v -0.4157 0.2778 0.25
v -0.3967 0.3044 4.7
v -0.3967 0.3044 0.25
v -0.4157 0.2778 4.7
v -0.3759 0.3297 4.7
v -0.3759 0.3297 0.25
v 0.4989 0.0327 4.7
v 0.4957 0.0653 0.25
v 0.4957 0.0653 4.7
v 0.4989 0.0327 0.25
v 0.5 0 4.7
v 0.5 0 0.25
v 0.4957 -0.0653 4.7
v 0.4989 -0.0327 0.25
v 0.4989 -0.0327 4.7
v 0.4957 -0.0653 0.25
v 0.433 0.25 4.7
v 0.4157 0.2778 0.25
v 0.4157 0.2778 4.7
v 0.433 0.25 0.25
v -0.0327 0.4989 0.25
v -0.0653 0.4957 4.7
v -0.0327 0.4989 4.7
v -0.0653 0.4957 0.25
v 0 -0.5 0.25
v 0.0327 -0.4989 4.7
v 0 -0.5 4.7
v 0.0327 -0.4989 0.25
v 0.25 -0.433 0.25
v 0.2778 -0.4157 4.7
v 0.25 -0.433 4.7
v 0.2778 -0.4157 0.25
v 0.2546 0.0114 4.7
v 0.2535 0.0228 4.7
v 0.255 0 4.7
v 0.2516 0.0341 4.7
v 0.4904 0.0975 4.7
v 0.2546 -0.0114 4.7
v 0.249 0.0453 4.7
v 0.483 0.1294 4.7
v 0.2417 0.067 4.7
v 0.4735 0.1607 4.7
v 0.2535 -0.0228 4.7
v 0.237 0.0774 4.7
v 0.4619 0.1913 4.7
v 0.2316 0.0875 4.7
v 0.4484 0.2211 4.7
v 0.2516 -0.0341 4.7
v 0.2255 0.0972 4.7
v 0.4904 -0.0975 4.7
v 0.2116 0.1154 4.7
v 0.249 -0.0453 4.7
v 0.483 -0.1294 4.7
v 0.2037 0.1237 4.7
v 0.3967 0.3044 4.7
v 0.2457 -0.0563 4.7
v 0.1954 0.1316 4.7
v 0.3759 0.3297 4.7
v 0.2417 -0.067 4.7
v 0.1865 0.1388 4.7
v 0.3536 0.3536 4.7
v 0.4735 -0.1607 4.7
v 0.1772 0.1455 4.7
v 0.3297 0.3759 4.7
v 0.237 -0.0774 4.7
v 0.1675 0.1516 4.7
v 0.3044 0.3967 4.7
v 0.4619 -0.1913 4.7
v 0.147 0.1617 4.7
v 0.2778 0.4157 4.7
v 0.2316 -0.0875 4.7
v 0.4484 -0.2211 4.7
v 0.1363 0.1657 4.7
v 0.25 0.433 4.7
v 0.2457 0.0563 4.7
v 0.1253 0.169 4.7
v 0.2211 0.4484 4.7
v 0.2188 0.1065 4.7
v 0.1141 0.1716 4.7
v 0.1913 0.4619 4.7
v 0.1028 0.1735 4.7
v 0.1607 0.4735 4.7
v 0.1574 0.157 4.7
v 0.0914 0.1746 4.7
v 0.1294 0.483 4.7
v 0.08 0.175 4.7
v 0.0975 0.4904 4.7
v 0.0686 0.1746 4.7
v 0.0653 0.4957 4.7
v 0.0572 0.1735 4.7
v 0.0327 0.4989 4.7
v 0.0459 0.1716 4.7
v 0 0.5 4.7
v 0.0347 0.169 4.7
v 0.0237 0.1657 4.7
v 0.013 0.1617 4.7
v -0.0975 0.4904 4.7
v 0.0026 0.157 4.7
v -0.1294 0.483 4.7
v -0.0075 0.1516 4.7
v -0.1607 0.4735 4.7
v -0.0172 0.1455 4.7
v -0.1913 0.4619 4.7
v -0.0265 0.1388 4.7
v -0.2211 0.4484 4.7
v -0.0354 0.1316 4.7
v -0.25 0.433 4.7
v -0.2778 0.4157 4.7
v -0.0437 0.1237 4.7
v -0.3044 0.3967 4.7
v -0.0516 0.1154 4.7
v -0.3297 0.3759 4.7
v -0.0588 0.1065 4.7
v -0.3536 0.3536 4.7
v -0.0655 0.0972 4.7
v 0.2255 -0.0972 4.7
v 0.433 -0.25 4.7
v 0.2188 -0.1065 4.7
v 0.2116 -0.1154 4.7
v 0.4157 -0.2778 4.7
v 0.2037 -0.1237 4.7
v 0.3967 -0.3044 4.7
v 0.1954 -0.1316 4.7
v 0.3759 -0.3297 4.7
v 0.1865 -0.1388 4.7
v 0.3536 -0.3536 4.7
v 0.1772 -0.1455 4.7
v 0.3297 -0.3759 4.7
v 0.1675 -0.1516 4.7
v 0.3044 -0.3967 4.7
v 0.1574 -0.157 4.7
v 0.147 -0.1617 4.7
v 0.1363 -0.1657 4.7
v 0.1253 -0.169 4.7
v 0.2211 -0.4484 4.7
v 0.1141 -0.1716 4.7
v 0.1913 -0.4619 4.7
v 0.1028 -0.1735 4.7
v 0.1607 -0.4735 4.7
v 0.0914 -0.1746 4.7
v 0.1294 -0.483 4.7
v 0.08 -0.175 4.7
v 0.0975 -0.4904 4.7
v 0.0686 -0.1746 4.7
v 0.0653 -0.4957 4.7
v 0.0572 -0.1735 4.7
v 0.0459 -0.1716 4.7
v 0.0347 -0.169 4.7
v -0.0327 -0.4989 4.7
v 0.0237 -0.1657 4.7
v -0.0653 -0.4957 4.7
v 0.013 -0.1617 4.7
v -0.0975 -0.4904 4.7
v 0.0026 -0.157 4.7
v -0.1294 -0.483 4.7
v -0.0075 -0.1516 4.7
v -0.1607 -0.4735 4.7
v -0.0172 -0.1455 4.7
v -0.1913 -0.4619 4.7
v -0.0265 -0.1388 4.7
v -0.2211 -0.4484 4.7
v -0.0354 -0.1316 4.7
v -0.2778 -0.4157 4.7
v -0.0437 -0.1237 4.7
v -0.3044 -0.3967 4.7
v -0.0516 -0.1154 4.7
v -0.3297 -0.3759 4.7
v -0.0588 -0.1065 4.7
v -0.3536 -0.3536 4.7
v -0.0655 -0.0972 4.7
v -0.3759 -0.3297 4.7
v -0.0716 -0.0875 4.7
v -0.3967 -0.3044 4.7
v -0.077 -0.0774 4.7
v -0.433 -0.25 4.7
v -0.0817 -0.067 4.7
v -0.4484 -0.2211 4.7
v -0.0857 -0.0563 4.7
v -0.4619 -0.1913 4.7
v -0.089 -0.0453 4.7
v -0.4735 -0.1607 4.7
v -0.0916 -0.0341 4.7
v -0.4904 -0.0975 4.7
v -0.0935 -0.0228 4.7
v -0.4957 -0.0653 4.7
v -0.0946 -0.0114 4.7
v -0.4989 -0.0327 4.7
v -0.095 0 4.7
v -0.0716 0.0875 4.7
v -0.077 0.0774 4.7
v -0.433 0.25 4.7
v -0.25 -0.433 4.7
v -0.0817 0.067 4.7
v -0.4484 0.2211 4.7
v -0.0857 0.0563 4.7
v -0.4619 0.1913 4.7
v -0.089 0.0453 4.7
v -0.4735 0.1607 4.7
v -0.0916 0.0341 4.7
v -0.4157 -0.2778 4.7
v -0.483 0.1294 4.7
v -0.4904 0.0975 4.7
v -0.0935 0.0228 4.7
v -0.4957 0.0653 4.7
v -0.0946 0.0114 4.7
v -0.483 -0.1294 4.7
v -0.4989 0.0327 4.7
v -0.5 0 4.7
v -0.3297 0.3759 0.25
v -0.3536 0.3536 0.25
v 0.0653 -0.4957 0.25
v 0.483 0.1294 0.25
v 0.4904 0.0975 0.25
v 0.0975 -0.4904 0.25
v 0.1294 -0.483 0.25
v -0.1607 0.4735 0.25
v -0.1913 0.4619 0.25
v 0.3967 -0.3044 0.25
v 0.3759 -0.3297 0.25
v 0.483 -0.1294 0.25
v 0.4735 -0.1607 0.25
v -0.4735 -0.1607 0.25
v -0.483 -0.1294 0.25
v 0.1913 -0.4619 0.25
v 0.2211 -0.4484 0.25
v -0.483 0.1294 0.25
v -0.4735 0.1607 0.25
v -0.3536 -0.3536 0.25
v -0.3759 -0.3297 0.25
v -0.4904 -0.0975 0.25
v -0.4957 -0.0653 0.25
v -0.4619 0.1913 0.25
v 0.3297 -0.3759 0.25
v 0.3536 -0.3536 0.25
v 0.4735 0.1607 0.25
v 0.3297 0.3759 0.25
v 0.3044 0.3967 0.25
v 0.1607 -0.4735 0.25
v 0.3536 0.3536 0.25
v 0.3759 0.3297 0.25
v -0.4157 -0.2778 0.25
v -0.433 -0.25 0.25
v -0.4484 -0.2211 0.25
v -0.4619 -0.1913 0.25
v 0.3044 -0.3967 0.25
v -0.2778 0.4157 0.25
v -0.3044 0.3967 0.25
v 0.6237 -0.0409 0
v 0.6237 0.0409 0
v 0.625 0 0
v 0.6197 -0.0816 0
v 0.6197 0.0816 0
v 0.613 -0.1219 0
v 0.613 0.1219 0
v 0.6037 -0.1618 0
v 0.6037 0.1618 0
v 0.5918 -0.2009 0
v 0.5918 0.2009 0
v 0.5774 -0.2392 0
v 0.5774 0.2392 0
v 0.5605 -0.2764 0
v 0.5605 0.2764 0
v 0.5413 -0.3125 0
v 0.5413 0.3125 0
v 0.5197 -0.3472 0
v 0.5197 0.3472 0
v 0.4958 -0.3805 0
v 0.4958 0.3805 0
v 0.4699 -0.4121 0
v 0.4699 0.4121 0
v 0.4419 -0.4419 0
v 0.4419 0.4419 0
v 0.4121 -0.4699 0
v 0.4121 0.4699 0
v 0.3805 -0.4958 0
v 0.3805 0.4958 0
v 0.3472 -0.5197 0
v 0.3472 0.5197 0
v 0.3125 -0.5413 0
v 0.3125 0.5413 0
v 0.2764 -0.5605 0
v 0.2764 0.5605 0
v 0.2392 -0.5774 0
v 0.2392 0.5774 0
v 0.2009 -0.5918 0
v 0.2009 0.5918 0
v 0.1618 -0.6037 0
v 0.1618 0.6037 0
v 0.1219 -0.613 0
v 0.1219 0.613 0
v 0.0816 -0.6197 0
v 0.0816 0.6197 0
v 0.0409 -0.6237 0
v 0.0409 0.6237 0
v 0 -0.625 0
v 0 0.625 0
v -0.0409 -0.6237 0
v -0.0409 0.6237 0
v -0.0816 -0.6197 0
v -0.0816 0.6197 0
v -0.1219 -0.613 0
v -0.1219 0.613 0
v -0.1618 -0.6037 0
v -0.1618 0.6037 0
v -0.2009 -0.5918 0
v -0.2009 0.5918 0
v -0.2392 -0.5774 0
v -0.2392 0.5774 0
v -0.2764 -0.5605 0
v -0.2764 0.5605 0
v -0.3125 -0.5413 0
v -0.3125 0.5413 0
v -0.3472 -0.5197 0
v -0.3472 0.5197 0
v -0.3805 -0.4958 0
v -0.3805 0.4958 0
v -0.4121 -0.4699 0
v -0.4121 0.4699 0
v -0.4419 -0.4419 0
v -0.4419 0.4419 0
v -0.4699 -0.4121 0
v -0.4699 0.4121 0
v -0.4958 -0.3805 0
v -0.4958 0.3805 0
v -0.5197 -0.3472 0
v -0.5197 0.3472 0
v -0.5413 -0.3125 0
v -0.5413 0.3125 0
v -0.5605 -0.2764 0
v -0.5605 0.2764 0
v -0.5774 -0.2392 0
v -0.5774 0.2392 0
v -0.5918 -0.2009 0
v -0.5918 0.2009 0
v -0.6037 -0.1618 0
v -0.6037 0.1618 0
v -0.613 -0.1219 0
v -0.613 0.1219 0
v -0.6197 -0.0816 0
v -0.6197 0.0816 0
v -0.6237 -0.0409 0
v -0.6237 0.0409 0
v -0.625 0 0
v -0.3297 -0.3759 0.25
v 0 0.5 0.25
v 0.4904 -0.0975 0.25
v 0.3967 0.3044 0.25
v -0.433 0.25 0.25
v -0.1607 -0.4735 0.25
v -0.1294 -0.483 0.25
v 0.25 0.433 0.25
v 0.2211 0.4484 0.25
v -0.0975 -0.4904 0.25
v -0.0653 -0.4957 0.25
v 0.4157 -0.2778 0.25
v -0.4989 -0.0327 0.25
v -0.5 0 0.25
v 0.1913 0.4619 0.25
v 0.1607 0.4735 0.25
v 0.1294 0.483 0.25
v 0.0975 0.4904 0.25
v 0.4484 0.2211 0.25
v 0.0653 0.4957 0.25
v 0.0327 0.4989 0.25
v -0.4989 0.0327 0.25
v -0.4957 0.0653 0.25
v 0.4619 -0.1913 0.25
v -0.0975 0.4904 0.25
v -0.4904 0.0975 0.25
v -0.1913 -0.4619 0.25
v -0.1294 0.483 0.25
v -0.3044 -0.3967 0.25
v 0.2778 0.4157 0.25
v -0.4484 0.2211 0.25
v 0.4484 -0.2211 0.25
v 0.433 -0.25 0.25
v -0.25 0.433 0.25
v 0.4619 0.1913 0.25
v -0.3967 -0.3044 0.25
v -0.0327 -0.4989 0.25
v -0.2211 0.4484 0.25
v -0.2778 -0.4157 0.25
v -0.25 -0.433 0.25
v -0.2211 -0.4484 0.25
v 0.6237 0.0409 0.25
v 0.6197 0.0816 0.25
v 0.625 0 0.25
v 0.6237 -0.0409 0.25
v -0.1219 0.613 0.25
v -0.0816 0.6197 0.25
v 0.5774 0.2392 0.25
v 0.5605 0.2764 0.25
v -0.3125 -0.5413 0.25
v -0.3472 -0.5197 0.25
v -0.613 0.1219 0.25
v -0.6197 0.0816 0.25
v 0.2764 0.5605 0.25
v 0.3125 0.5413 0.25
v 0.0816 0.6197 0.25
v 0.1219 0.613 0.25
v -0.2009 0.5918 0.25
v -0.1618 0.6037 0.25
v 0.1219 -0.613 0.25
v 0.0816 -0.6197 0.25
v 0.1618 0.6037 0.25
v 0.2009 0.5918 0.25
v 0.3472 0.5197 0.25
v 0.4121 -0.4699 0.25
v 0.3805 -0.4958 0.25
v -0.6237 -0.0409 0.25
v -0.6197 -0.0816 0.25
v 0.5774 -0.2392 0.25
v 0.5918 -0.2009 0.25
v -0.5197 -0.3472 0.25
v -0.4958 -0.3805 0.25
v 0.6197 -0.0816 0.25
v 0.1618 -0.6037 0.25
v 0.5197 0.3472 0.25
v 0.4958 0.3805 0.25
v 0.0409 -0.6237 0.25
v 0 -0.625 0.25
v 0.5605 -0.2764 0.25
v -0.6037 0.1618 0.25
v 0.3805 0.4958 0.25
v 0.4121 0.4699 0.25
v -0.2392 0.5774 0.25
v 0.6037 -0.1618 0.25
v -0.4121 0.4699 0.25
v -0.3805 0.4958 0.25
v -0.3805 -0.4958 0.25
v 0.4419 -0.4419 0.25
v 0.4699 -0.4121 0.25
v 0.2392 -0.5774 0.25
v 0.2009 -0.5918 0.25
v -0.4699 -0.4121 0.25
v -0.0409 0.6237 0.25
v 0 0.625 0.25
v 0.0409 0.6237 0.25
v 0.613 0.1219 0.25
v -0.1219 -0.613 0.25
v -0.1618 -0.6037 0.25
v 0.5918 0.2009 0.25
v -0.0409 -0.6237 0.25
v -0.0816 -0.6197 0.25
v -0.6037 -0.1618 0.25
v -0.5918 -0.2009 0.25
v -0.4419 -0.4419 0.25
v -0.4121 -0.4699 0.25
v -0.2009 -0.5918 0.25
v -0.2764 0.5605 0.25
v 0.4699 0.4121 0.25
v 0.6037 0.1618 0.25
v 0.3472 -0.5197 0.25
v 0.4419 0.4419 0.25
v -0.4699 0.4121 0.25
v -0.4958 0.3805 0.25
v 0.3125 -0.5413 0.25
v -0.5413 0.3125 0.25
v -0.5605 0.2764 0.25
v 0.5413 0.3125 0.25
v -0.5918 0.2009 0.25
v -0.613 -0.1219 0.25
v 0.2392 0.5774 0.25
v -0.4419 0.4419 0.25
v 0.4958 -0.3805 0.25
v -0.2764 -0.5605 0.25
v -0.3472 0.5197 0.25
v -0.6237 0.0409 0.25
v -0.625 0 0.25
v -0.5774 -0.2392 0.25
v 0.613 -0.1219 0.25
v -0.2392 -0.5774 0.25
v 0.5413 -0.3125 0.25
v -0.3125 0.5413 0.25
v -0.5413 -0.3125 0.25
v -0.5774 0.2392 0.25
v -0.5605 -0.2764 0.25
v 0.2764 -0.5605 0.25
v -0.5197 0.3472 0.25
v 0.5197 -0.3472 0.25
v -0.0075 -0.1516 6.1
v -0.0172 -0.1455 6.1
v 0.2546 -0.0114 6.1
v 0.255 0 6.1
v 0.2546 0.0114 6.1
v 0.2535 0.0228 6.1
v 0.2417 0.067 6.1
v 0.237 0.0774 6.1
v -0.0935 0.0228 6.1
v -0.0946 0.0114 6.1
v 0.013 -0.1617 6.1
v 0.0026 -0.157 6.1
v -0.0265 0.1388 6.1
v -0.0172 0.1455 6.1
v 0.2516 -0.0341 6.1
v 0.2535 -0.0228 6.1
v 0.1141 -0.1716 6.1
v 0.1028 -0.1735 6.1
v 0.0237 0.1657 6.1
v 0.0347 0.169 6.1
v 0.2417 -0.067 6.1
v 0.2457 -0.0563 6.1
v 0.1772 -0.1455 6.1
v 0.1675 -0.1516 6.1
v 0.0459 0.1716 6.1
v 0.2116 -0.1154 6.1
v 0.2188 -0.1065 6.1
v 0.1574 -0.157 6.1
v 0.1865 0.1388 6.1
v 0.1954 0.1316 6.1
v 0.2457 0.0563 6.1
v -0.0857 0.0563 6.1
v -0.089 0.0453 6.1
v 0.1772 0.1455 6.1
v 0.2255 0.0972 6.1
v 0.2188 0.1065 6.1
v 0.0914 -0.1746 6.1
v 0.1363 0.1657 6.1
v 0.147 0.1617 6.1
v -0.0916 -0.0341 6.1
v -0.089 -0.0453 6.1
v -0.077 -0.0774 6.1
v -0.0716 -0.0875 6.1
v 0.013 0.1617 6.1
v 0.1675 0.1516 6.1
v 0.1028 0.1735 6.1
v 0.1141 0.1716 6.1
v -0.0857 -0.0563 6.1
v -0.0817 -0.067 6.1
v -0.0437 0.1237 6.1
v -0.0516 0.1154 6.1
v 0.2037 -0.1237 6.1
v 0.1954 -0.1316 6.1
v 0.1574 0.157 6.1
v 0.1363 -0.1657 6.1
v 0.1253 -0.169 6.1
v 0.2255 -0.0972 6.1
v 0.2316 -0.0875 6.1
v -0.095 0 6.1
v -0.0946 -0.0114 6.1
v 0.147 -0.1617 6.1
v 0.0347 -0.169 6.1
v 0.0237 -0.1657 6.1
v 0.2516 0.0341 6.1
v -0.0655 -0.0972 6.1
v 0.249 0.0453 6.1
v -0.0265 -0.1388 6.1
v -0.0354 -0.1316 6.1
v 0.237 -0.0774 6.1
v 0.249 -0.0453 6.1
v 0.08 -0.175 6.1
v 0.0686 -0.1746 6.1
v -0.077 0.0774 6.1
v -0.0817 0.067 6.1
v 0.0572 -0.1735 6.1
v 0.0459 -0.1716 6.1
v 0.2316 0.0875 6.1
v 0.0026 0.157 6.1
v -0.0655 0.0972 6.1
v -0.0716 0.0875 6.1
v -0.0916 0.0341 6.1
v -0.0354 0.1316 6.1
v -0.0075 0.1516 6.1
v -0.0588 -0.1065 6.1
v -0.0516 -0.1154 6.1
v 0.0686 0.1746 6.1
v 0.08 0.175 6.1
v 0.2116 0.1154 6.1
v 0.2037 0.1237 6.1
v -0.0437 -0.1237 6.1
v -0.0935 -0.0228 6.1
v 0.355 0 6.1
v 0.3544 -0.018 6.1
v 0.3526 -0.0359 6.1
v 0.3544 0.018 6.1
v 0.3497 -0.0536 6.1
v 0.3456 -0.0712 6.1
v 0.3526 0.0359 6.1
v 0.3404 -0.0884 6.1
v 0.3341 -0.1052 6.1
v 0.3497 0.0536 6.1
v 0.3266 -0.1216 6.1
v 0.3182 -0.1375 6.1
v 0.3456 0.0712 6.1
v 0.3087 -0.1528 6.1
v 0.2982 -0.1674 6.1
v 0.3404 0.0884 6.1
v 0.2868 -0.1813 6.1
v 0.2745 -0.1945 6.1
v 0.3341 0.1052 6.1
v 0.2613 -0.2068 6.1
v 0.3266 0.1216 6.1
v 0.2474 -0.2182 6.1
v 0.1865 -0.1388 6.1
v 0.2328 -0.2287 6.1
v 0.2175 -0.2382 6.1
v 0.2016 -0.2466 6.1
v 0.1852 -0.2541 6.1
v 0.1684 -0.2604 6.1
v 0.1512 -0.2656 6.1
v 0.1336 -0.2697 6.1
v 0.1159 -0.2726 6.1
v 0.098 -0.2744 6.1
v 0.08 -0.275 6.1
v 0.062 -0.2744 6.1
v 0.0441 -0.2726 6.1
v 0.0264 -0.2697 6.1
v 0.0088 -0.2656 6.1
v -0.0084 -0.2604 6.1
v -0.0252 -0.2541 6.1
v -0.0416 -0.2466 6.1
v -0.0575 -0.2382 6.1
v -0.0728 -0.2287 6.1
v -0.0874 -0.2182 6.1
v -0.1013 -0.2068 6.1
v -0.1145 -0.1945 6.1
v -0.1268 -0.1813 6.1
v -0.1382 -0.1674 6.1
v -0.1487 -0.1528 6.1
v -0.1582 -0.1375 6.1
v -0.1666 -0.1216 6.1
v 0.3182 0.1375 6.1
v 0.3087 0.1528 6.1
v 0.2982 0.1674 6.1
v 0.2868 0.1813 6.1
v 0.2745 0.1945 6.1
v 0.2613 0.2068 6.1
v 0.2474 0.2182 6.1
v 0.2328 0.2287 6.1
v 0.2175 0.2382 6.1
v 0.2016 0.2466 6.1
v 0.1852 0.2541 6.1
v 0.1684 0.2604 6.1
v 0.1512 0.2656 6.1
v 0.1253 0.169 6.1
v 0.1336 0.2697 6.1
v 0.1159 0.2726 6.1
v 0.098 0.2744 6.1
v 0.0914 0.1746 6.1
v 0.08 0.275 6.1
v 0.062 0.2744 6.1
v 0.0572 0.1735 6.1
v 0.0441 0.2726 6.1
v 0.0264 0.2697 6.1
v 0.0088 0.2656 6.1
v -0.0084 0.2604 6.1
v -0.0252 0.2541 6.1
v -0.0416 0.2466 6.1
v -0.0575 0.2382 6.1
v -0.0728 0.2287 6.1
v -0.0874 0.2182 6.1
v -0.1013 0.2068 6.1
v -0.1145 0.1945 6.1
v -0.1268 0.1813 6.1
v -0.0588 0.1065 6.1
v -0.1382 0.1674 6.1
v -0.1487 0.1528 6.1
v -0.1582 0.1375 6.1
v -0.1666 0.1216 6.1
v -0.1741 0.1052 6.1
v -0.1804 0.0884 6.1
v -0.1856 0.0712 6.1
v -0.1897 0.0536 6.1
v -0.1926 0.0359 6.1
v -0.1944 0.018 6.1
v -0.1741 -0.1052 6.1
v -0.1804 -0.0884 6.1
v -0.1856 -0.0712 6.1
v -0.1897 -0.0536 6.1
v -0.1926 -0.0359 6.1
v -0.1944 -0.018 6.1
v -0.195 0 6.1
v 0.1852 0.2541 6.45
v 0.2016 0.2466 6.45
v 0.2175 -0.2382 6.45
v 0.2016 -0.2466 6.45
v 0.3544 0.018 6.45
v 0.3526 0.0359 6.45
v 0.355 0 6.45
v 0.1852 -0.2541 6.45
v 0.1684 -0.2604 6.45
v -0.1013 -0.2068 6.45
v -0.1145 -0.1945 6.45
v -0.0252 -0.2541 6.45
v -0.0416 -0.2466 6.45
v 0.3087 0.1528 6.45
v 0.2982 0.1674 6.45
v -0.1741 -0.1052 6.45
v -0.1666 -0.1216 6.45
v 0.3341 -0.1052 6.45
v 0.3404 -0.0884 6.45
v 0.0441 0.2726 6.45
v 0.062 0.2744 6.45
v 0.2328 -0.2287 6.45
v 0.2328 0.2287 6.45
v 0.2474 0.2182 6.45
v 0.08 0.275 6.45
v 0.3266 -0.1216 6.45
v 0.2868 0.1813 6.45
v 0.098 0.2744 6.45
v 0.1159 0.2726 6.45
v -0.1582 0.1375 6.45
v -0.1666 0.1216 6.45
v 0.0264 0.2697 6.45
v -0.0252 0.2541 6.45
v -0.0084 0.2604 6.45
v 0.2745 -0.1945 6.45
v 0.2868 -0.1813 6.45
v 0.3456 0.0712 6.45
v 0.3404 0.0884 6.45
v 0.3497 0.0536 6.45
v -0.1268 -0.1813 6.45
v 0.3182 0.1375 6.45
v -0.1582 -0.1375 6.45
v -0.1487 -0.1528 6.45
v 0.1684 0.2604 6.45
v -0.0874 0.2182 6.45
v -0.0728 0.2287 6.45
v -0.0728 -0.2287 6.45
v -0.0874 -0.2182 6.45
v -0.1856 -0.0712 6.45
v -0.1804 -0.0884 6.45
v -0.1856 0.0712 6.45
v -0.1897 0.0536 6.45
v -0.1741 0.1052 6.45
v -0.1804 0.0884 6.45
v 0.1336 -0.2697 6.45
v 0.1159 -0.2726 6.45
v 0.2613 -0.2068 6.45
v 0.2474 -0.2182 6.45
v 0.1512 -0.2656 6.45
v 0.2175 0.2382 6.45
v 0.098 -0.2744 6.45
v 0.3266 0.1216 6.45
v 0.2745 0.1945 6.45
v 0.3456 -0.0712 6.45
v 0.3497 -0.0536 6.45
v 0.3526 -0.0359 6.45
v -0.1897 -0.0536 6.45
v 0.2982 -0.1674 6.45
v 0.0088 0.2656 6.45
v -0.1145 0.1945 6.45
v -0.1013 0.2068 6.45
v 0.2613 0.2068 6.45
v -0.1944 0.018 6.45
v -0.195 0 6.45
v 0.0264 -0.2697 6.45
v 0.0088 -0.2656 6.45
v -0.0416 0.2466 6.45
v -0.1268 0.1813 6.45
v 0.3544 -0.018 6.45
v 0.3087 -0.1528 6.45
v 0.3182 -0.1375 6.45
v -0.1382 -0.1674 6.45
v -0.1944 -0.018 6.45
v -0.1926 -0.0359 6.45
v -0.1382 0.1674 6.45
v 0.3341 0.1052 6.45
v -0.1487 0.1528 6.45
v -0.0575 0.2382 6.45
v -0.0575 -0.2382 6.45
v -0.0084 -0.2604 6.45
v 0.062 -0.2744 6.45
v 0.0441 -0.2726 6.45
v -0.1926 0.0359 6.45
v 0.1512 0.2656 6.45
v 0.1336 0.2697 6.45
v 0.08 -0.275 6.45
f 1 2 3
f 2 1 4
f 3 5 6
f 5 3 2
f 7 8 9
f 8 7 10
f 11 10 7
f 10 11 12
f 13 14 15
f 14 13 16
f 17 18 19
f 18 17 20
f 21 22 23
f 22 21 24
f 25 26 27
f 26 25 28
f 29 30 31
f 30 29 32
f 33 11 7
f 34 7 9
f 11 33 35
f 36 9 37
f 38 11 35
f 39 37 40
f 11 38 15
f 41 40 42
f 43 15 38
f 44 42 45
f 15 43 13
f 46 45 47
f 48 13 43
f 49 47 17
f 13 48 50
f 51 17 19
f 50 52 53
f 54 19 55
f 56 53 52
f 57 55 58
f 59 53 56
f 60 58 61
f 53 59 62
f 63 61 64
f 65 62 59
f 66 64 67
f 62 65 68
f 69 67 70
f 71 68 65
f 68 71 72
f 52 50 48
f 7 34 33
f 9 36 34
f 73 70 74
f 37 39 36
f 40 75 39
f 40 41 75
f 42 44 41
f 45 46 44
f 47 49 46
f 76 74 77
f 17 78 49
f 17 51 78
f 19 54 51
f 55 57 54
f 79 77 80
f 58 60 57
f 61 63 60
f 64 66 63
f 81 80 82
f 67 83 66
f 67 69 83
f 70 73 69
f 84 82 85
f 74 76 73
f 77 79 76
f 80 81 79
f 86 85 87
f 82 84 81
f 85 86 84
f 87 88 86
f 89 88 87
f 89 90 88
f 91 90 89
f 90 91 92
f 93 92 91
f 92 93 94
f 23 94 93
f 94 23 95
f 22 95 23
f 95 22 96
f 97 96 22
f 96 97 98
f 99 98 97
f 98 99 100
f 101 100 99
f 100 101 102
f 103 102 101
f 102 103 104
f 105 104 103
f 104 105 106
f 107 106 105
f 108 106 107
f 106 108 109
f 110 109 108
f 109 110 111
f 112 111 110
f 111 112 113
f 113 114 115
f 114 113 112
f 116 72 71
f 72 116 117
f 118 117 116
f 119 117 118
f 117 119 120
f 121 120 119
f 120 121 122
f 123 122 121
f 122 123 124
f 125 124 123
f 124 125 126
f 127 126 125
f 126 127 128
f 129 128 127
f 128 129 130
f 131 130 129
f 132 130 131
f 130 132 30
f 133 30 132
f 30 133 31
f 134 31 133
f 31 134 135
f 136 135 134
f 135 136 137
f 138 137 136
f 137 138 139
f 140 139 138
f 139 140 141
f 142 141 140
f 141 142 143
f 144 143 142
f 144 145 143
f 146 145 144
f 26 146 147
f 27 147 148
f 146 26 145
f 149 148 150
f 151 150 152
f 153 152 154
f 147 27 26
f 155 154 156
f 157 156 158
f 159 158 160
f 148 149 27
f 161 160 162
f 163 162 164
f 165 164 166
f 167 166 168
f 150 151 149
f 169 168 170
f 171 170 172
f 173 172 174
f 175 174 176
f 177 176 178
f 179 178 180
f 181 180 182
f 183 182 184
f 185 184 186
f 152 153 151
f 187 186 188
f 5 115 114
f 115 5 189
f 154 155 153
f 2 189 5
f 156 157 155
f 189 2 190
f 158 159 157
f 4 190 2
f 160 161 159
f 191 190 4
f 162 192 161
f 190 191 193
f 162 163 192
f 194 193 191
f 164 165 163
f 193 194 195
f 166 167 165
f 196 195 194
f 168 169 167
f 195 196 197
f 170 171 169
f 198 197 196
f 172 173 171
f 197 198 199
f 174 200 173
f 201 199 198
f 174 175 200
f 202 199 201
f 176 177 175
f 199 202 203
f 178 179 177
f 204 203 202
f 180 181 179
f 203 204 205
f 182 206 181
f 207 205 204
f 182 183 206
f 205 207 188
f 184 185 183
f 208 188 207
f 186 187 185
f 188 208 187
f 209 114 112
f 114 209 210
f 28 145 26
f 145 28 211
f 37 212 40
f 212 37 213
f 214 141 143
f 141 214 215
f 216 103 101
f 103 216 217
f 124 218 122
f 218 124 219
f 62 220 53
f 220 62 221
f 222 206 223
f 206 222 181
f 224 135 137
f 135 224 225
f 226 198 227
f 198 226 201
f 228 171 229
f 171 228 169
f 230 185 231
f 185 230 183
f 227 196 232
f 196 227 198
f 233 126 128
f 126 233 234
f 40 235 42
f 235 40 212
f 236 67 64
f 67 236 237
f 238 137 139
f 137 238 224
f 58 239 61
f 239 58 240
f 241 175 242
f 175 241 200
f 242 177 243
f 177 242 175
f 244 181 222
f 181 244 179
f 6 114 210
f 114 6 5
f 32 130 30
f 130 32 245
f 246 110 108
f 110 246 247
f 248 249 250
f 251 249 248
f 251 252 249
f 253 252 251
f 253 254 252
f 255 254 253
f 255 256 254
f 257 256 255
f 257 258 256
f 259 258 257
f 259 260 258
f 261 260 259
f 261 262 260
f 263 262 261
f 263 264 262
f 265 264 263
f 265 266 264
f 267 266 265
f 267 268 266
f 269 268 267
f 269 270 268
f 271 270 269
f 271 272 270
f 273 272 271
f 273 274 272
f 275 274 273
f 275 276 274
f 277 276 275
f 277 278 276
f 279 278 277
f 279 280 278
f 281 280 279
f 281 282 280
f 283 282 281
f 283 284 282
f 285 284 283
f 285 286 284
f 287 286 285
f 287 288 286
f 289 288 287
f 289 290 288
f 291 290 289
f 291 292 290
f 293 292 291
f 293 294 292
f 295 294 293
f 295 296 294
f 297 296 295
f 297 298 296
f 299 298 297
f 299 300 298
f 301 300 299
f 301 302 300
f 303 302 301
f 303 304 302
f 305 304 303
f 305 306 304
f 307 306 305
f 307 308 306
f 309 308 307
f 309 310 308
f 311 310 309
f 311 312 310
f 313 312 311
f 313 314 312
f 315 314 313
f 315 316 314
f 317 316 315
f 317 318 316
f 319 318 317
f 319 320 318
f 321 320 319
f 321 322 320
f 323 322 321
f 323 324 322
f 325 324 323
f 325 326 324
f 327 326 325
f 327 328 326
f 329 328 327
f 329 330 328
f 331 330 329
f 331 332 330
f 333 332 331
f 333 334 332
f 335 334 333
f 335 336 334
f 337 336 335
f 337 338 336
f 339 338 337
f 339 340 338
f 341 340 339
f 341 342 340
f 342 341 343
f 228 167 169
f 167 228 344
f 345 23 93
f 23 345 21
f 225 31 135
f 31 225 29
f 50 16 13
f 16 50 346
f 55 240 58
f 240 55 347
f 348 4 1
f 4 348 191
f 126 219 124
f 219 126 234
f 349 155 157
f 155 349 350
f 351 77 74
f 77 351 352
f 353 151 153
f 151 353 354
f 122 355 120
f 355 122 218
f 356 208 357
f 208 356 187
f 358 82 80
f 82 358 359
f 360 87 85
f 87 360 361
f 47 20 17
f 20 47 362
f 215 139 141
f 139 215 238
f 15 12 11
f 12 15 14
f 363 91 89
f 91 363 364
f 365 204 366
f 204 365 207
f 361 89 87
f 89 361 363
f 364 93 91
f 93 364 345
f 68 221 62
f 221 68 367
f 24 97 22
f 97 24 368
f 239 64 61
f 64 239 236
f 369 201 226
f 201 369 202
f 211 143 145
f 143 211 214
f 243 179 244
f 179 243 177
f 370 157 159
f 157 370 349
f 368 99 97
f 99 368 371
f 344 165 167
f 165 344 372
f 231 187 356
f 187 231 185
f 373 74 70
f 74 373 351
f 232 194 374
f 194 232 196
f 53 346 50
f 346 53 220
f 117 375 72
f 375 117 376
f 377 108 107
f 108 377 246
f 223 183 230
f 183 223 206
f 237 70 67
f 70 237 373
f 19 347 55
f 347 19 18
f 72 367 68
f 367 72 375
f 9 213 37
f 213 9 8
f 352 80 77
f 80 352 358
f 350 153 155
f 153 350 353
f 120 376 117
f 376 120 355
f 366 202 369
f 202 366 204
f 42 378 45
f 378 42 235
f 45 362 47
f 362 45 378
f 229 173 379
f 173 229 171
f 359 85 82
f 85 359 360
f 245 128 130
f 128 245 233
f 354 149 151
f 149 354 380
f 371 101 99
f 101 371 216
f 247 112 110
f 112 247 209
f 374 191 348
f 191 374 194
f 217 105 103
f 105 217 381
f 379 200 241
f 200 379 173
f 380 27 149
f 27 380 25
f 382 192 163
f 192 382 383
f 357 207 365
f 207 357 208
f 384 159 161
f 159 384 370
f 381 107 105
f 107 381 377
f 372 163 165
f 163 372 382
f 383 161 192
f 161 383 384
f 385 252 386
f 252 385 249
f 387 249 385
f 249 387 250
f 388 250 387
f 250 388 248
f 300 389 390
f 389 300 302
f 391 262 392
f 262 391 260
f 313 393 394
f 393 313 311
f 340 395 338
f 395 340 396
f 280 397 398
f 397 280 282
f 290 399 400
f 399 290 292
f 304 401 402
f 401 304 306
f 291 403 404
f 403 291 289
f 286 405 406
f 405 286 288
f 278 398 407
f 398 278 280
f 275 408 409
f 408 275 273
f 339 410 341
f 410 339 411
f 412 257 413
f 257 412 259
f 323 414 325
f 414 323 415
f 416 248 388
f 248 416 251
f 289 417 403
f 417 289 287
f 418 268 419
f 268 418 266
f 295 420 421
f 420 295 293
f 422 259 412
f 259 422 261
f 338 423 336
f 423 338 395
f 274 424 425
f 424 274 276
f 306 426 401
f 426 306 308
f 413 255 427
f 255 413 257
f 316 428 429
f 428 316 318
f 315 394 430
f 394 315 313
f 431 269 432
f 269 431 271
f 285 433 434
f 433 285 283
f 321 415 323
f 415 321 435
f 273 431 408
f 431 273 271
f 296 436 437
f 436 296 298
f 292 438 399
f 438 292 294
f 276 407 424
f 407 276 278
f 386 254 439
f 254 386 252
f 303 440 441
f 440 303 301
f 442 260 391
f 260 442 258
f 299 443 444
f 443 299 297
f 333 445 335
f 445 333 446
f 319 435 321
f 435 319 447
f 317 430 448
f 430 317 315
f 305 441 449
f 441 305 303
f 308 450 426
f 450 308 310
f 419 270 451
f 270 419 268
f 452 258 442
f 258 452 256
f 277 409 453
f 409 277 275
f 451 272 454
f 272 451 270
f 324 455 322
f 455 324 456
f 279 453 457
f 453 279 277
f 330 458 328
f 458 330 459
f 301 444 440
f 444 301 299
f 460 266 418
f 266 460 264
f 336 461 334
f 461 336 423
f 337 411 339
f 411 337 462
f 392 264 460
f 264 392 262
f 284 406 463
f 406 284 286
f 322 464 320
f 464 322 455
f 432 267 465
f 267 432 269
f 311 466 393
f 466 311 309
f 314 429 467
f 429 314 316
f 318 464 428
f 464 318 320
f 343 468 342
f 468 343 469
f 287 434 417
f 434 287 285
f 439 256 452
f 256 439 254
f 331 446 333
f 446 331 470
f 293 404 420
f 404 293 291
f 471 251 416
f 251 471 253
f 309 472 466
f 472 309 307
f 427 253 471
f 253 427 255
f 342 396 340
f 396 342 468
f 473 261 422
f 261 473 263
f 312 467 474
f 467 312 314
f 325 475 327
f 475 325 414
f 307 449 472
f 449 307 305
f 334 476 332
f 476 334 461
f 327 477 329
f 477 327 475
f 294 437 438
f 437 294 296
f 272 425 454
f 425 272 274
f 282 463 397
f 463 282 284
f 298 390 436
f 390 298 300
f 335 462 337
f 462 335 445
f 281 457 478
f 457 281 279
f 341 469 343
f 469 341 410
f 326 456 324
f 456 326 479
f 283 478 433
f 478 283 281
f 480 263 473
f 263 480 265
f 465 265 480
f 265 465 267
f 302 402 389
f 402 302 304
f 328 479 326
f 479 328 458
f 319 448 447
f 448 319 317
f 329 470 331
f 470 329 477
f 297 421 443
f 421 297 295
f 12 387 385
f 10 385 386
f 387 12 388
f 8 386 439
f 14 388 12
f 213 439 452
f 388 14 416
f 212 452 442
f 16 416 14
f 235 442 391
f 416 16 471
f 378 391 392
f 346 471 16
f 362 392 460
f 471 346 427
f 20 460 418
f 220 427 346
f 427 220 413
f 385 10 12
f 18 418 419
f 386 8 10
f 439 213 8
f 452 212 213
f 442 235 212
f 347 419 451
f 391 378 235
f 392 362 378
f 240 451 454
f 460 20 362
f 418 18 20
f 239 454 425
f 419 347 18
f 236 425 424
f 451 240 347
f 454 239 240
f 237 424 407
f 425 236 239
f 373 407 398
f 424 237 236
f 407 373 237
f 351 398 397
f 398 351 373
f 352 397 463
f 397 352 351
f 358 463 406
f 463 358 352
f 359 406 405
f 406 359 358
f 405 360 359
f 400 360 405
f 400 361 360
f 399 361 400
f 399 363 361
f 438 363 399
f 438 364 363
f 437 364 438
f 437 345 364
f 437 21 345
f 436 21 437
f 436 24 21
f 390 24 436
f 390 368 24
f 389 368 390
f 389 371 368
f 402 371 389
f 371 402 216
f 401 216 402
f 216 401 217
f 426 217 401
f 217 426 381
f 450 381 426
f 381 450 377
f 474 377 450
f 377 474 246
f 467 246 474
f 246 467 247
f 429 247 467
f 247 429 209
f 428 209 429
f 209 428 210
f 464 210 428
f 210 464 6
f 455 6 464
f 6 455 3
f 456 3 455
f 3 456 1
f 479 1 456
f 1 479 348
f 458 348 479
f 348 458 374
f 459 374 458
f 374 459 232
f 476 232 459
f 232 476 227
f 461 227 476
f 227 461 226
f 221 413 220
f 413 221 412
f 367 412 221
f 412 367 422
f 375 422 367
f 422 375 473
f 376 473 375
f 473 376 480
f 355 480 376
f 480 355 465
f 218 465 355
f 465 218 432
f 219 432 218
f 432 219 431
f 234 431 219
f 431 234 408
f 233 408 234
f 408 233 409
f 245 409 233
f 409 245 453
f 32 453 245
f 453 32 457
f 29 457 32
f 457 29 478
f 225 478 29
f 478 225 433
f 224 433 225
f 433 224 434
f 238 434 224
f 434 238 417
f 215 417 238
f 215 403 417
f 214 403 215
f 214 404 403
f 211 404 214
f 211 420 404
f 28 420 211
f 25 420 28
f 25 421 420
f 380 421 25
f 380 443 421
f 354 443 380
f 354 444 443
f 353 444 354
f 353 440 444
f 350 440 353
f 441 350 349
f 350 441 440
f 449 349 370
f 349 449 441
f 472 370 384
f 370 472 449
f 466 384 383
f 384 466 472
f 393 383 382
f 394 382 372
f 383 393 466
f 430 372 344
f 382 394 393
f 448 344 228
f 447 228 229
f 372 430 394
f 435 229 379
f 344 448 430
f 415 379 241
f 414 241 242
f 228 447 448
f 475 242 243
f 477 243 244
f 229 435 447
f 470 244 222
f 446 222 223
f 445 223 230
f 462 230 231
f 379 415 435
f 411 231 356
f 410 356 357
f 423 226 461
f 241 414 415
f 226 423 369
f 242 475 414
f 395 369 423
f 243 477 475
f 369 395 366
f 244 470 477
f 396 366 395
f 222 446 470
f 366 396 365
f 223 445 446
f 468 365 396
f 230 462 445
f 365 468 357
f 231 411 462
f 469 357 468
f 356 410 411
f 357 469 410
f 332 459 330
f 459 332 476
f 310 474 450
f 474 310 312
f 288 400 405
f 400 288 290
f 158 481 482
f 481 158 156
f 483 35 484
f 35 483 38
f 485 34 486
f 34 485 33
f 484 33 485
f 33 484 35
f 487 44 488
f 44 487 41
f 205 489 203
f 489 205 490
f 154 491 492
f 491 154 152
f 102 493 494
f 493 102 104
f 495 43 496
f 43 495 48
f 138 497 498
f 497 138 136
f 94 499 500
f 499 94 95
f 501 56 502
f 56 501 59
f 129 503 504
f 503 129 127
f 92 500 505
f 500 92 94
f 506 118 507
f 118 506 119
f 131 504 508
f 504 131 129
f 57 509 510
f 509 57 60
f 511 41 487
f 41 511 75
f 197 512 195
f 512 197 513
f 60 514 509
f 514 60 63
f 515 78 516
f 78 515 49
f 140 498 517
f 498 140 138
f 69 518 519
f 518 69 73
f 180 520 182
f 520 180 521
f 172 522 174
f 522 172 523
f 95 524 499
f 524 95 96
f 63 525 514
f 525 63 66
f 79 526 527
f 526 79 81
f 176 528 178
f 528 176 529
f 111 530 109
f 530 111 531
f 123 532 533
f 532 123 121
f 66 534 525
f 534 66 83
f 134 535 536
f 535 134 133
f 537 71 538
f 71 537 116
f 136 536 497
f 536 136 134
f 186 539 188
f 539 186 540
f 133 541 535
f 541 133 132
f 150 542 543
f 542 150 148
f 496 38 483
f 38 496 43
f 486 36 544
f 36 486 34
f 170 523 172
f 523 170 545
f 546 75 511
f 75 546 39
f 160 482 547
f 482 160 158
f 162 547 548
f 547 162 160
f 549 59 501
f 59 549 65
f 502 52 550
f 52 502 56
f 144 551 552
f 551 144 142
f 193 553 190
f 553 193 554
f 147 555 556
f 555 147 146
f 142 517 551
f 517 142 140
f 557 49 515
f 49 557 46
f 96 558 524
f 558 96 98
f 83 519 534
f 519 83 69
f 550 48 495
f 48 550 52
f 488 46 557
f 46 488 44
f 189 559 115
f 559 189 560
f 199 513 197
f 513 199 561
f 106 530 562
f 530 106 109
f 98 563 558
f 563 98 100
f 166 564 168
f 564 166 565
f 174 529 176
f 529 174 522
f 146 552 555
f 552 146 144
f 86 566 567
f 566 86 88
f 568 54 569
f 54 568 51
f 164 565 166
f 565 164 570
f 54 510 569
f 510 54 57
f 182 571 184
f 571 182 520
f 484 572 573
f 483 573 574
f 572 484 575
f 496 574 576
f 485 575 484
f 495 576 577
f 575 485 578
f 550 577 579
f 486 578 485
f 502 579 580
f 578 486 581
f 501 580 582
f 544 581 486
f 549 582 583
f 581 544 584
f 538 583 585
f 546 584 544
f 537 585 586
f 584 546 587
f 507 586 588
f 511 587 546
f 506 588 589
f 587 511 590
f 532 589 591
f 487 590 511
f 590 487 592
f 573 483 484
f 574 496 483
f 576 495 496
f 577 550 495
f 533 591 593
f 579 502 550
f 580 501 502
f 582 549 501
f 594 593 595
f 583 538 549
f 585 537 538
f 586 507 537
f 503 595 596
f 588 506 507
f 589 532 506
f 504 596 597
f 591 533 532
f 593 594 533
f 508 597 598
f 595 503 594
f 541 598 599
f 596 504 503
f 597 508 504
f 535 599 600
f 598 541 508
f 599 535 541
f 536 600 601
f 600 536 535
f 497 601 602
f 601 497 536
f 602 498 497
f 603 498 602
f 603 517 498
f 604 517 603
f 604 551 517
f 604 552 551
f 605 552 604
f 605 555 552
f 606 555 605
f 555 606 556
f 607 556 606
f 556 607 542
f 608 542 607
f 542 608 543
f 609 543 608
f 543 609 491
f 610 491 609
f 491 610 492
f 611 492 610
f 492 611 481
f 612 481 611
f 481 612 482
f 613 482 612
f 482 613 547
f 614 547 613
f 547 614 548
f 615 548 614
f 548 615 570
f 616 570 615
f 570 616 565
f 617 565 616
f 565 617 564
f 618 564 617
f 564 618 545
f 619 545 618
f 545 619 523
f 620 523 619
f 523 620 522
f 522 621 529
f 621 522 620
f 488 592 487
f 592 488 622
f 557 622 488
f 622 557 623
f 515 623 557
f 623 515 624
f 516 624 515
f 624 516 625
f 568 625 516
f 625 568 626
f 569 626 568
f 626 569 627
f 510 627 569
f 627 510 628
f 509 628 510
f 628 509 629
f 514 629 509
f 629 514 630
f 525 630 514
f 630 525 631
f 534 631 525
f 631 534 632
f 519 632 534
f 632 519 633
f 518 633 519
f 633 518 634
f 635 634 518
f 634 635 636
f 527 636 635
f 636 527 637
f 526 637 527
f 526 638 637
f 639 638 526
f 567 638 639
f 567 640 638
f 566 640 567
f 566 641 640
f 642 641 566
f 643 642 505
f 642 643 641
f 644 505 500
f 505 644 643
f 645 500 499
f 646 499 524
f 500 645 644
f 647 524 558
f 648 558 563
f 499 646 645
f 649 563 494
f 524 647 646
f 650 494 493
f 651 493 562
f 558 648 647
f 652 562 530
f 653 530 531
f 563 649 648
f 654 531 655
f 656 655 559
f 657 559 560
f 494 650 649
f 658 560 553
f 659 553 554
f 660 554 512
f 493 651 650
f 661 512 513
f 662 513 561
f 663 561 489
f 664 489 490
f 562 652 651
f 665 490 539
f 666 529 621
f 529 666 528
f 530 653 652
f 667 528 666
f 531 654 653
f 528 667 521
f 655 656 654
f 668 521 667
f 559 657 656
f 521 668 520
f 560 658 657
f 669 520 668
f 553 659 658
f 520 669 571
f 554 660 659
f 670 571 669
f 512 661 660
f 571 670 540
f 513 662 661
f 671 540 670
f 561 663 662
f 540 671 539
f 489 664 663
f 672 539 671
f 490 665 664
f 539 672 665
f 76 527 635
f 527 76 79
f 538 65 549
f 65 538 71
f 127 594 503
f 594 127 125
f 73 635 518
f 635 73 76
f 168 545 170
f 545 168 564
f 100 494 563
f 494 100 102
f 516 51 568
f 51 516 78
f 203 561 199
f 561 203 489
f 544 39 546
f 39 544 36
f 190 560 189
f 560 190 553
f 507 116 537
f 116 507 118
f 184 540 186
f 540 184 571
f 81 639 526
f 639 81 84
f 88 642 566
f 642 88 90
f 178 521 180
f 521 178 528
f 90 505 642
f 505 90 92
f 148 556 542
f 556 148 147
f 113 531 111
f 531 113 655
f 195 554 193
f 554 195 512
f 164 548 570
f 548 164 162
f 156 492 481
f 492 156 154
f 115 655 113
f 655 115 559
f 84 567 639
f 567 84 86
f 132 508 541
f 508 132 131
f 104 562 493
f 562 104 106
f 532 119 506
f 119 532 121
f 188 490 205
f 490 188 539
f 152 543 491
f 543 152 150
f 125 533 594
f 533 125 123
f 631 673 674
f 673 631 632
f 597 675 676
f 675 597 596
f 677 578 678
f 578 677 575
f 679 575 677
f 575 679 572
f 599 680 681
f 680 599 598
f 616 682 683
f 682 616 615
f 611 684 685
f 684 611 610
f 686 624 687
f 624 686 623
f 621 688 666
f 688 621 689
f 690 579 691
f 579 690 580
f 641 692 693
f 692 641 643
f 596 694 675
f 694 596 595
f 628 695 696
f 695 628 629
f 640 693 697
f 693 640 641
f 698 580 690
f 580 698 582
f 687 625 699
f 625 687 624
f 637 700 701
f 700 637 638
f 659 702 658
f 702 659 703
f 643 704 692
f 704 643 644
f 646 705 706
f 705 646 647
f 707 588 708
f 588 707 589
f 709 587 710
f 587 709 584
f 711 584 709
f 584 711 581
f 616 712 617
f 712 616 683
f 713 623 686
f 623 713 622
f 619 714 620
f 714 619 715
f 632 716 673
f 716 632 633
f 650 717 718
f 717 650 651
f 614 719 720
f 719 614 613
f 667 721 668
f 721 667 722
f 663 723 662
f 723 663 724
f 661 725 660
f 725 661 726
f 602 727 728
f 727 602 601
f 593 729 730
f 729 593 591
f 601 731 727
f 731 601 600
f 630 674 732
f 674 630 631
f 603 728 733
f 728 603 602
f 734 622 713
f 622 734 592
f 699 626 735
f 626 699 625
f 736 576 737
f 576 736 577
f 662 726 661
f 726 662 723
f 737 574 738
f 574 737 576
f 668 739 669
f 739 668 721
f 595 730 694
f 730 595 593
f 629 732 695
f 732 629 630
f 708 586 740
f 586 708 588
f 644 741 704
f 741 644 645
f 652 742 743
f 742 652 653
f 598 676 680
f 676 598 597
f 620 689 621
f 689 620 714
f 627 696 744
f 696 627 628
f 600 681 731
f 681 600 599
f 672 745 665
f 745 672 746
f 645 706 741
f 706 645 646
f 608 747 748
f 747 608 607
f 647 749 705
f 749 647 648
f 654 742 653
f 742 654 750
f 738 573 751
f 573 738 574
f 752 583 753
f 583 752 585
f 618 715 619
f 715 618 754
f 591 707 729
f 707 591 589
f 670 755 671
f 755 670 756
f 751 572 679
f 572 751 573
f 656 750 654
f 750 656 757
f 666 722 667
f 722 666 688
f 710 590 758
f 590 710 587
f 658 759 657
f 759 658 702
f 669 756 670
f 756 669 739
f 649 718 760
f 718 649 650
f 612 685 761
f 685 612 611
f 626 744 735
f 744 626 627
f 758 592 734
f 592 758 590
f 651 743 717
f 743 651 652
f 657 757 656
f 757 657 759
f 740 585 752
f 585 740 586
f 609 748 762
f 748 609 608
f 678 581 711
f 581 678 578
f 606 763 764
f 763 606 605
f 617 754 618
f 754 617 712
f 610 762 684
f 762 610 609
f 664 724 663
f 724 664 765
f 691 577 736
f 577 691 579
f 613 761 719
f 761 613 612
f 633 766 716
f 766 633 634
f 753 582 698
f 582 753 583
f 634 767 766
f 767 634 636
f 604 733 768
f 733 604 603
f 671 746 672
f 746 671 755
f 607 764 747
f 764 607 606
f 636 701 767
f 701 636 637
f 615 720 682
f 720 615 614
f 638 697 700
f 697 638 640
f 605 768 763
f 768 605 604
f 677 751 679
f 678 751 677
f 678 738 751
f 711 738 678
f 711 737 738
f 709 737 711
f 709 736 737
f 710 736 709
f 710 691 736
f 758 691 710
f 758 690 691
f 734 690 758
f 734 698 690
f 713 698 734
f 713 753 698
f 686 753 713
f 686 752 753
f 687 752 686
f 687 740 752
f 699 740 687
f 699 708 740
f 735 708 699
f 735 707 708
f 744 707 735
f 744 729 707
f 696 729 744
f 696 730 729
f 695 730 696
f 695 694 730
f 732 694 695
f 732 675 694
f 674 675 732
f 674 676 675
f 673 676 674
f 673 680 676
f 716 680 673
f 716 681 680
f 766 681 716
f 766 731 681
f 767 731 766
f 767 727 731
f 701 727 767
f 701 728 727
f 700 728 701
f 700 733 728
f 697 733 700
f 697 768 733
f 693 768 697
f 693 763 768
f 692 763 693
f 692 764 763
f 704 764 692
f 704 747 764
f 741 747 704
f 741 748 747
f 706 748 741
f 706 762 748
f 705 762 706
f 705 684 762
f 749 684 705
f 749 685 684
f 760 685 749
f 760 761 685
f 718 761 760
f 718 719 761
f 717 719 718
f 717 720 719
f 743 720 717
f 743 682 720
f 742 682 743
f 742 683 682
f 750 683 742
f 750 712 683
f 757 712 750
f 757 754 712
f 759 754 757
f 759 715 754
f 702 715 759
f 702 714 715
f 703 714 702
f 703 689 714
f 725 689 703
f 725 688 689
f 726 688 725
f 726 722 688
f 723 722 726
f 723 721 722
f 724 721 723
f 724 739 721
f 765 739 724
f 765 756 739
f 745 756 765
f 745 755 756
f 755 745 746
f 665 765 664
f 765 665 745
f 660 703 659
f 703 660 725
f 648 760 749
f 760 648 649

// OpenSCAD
$fn = 96;

body_d = 1.0;
body_h = 4.7;

stem_d = 0.35;
stem_h = 1.6;

cap_d = 0.55;
cap_h = 0.35;

base_flange_d = 1.25;
base_flange_h = 0.25;

module toggle_switch() {
    union() {
        // Main cylindrical body
        cylinder(d=body_d, h=body_h);

        // Small base flange
        translate([0,0,0])
            cylinder(d=base_flange_d, h=base_flange_h);

        // Toggle stem (slightly offset/tilted look via small lateral shift)
        translate([0.08, 0, body_h - 0.2])
            cylinder(d=stem_d, h=stem_h);

        // Stem cap
        translate([0.08, 0, body_h - 0.2 + stem_h])
            cylinder(d=cap_d, h=cap_h);
    }
}

toggle_switch();
